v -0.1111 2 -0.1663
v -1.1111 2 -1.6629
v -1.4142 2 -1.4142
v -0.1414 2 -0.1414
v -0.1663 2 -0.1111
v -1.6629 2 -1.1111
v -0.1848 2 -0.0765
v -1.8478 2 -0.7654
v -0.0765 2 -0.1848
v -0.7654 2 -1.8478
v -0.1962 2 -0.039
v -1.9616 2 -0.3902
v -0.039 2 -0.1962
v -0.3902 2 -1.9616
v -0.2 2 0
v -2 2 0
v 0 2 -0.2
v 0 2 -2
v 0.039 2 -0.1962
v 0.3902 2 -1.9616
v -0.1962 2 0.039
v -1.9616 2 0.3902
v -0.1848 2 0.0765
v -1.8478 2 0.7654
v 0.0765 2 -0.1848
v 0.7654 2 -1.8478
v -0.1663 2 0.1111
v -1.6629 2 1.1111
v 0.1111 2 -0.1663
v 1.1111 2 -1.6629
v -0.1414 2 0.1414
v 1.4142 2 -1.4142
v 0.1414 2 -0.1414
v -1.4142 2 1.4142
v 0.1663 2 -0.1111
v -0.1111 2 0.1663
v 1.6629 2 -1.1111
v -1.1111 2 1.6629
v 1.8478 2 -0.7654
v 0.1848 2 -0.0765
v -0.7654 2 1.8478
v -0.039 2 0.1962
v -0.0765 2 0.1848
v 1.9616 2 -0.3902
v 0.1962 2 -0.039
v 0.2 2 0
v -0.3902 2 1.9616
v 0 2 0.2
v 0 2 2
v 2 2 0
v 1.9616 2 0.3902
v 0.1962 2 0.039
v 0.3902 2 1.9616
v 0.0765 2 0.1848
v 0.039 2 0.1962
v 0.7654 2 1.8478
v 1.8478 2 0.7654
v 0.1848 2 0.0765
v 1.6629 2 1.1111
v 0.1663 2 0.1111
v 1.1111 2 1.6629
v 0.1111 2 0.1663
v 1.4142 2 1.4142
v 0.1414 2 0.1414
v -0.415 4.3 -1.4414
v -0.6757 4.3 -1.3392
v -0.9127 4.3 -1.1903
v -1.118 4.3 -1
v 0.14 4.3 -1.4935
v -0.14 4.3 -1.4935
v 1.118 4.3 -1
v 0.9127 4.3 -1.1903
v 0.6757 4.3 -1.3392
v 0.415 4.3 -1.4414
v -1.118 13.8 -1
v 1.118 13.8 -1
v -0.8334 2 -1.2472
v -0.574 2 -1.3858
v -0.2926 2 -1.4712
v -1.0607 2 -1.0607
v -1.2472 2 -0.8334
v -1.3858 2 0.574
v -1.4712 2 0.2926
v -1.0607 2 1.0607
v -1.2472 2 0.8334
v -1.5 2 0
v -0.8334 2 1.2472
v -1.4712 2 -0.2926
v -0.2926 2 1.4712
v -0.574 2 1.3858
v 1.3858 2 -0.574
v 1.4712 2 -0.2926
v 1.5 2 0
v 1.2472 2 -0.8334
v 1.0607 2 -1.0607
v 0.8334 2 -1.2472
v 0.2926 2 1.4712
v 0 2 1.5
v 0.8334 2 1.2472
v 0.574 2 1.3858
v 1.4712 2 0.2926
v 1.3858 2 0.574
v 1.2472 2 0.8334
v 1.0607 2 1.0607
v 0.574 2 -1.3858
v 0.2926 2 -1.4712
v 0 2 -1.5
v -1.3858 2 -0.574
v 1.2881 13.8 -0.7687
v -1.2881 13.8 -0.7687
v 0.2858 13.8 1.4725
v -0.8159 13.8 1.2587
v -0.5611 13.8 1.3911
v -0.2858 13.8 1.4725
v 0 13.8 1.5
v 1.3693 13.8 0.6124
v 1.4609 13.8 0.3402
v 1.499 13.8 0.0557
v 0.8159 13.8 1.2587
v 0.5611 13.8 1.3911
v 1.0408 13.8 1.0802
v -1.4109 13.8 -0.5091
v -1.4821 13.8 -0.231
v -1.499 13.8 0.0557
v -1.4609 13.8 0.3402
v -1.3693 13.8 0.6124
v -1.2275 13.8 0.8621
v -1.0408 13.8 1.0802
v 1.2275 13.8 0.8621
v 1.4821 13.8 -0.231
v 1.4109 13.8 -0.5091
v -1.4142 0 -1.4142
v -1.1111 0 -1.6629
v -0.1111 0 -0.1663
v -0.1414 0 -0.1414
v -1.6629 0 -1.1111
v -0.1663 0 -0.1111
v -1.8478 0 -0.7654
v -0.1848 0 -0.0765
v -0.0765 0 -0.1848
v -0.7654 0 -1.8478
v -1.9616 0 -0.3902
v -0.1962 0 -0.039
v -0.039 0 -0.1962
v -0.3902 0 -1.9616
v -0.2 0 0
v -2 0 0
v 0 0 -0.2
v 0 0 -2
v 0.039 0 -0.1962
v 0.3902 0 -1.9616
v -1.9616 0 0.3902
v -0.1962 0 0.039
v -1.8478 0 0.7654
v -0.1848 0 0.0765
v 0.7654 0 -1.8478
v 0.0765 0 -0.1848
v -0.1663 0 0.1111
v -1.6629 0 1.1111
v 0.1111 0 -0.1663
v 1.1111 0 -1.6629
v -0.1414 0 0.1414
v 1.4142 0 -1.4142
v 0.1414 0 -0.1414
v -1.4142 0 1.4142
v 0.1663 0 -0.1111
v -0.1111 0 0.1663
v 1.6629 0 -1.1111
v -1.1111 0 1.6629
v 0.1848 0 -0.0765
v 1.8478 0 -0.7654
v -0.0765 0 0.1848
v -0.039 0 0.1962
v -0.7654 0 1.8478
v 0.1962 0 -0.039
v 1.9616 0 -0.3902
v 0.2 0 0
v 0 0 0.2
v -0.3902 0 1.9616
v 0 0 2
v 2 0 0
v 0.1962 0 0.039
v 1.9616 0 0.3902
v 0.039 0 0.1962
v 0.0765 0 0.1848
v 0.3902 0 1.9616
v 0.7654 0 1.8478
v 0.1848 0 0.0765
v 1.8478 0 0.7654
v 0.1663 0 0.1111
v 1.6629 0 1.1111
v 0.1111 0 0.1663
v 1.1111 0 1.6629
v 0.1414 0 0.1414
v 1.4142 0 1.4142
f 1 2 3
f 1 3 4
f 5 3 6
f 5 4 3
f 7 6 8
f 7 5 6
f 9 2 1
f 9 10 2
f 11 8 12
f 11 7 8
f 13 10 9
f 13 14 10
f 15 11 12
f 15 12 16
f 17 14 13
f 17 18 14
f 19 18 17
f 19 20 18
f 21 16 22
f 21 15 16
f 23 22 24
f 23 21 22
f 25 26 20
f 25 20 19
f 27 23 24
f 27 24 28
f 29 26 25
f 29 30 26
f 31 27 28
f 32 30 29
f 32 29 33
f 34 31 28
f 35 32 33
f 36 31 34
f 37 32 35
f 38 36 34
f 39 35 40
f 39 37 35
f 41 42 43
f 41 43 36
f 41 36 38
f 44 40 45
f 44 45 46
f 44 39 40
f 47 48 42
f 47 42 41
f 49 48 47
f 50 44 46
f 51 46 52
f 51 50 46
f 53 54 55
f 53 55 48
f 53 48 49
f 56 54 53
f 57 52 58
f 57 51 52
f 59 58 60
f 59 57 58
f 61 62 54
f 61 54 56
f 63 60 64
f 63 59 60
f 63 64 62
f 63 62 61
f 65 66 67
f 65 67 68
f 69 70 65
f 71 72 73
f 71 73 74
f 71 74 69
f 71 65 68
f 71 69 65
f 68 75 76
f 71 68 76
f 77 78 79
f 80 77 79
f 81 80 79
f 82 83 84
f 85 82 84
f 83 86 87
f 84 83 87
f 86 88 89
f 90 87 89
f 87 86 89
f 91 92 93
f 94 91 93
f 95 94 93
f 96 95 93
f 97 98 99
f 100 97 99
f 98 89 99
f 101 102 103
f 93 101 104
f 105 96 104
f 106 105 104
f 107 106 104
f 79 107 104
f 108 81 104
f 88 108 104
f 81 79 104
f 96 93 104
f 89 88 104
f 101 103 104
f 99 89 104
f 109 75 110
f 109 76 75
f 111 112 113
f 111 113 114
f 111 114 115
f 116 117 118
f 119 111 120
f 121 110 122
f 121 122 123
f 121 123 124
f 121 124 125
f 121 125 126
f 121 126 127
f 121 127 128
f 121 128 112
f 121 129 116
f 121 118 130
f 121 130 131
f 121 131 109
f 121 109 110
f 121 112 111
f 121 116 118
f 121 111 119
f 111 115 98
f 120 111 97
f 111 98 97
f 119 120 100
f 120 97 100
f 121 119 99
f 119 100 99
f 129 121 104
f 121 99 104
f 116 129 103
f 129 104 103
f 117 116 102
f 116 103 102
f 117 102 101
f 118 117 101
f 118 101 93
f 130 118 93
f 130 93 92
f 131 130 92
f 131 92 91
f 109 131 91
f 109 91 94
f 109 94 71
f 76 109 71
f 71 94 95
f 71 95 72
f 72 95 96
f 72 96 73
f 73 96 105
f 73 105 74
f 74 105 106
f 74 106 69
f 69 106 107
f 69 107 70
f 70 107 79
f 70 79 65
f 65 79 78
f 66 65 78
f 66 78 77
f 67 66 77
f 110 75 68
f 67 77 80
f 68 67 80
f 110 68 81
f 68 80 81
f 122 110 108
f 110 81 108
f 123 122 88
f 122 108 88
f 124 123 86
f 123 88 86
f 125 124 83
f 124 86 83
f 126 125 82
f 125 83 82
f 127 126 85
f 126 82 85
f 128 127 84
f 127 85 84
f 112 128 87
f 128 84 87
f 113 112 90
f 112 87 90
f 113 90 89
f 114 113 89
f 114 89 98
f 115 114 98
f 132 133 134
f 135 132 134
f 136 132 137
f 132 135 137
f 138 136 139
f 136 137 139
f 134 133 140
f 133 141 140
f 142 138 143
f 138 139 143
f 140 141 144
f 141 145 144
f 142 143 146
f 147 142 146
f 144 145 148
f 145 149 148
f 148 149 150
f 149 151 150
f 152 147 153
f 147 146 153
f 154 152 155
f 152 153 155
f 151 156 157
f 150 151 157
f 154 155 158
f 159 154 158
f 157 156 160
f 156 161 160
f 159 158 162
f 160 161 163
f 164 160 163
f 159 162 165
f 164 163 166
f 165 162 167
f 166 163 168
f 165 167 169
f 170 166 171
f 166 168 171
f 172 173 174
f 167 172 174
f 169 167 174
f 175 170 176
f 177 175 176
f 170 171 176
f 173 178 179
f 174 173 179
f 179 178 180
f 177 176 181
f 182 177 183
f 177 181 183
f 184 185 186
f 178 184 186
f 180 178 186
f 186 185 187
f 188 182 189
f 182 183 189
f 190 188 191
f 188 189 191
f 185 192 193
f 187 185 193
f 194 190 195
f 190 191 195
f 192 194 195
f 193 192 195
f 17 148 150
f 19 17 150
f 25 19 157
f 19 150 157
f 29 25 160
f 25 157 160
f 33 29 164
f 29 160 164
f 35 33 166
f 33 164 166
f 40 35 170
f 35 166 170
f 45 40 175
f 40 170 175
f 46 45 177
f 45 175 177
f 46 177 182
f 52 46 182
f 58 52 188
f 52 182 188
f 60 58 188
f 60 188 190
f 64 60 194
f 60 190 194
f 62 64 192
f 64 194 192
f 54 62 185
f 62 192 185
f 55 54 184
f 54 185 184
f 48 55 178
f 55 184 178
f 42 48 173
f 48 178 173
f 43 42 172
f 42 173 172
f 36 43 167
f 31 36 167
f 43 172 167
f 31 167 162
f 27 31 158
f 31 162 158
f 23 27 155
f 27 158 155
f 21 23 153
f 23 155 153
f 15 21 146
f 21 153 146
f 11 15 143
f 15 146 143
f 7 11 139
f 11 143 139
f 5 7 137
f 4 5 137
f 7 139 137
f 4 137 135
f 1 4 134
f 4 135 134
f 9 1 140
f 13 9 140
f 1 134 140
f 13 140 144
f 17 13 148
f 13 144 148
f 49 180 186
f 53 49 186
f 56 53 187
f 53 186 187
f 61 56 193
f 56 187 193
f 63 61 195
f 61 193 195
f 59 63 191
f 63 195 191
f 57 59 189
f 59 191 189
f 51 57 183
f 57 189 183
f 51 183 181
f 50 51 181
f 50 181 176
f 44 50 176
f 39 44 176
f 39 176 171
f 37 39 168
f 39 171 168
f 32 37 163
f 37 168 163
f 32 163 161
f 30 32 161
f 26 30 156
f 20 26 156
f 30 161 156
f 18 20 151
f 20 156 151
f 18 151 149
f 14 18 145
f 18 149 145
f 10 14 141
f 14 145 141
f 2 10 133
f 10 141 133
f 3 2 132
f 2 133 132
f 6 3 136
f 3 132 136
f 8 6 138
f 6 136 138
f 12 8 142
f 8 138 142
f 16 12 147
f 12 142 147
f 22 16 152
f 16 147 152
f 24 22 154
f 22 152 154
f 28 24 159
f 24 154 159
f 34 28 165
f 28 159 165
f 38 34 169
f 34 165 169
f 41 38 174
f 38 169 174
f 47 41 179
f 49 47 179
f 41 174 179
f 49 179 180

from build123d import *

# Parameters (mm, degrees)
CROQUIS1_R              = 2
SALIENTE_EXTRUIR1_DEPTH = 2
CROQUIS2_R              = 0.2
CORTAR_EXTRUIR1_DEPTH   = 2
CROQUIS3_R              = 1.5
SALIENTE_EXTRUIR2_DEPTH = 11.8
CORTAR_EXTRUIR2_DEPTH   = 9.5


with BuildPart() as part:
    # Croquis1 → Saliente-Extruir1 (new body)
    with BuildSketch(Plane(origin=(0, 0, 0), x_dir=(1, 0, 0), z_dir=(0, 1, 0))):
        with Locations(Location((0, 0, 0), (0, 0, 270))):
            Circle(CROQUIS1_R)
    extrude(amount=SALIENTE_EXTRUIR1_DEPTH)

    # Croquis2 → Cortar-Extruir1 (cut)
    with BuildSketch(Plane.XZ):
        with Locations(Location((0, 0, 0), (0, 0, 270))):
            Circle(CROQUIS2_R)
    extrude(amount=-CORTAR_EXTRUIR1_DEPTH, mode=Mode.SUBTRACT)


with BuildPart() as body_2:
    # Croquis3 → Saliente-Extruir2 (new body)
    with BuildSketch(Plane(origin=(0, 2, 0), x_dir=(1, 0, 0), z_dir=(0, 1, 0))):
        with Locations(Location((0, 0, 0), (0, 0, 270))):
            Circle(CROQUIS3_R)
    extrude(amount=SALIENTE_EXTRUIR2_DEPTH)

    # Croquis5 → Cortar-Extruir2 (cut)
    with BuildSketch(Plane(origin=(0, 13.8, 0), x_dir=(1, 0, 0), z_dir=(0, 1, 0))):
        with BuildLine():
            Line((0, 1), (1.118033989, 1))
            ThreePointArc((1.118033989, 1), (0, 1.5), (-1.118033989, 1))
            Line((-1.118033989, 1), (0, 1))
        make_face()
    extrude(amount=-CORTAR_EXTRUIR2_DEPTH, mode=Mode.SUBTRACT)


solid = Compound([part.part, body_2.part])
